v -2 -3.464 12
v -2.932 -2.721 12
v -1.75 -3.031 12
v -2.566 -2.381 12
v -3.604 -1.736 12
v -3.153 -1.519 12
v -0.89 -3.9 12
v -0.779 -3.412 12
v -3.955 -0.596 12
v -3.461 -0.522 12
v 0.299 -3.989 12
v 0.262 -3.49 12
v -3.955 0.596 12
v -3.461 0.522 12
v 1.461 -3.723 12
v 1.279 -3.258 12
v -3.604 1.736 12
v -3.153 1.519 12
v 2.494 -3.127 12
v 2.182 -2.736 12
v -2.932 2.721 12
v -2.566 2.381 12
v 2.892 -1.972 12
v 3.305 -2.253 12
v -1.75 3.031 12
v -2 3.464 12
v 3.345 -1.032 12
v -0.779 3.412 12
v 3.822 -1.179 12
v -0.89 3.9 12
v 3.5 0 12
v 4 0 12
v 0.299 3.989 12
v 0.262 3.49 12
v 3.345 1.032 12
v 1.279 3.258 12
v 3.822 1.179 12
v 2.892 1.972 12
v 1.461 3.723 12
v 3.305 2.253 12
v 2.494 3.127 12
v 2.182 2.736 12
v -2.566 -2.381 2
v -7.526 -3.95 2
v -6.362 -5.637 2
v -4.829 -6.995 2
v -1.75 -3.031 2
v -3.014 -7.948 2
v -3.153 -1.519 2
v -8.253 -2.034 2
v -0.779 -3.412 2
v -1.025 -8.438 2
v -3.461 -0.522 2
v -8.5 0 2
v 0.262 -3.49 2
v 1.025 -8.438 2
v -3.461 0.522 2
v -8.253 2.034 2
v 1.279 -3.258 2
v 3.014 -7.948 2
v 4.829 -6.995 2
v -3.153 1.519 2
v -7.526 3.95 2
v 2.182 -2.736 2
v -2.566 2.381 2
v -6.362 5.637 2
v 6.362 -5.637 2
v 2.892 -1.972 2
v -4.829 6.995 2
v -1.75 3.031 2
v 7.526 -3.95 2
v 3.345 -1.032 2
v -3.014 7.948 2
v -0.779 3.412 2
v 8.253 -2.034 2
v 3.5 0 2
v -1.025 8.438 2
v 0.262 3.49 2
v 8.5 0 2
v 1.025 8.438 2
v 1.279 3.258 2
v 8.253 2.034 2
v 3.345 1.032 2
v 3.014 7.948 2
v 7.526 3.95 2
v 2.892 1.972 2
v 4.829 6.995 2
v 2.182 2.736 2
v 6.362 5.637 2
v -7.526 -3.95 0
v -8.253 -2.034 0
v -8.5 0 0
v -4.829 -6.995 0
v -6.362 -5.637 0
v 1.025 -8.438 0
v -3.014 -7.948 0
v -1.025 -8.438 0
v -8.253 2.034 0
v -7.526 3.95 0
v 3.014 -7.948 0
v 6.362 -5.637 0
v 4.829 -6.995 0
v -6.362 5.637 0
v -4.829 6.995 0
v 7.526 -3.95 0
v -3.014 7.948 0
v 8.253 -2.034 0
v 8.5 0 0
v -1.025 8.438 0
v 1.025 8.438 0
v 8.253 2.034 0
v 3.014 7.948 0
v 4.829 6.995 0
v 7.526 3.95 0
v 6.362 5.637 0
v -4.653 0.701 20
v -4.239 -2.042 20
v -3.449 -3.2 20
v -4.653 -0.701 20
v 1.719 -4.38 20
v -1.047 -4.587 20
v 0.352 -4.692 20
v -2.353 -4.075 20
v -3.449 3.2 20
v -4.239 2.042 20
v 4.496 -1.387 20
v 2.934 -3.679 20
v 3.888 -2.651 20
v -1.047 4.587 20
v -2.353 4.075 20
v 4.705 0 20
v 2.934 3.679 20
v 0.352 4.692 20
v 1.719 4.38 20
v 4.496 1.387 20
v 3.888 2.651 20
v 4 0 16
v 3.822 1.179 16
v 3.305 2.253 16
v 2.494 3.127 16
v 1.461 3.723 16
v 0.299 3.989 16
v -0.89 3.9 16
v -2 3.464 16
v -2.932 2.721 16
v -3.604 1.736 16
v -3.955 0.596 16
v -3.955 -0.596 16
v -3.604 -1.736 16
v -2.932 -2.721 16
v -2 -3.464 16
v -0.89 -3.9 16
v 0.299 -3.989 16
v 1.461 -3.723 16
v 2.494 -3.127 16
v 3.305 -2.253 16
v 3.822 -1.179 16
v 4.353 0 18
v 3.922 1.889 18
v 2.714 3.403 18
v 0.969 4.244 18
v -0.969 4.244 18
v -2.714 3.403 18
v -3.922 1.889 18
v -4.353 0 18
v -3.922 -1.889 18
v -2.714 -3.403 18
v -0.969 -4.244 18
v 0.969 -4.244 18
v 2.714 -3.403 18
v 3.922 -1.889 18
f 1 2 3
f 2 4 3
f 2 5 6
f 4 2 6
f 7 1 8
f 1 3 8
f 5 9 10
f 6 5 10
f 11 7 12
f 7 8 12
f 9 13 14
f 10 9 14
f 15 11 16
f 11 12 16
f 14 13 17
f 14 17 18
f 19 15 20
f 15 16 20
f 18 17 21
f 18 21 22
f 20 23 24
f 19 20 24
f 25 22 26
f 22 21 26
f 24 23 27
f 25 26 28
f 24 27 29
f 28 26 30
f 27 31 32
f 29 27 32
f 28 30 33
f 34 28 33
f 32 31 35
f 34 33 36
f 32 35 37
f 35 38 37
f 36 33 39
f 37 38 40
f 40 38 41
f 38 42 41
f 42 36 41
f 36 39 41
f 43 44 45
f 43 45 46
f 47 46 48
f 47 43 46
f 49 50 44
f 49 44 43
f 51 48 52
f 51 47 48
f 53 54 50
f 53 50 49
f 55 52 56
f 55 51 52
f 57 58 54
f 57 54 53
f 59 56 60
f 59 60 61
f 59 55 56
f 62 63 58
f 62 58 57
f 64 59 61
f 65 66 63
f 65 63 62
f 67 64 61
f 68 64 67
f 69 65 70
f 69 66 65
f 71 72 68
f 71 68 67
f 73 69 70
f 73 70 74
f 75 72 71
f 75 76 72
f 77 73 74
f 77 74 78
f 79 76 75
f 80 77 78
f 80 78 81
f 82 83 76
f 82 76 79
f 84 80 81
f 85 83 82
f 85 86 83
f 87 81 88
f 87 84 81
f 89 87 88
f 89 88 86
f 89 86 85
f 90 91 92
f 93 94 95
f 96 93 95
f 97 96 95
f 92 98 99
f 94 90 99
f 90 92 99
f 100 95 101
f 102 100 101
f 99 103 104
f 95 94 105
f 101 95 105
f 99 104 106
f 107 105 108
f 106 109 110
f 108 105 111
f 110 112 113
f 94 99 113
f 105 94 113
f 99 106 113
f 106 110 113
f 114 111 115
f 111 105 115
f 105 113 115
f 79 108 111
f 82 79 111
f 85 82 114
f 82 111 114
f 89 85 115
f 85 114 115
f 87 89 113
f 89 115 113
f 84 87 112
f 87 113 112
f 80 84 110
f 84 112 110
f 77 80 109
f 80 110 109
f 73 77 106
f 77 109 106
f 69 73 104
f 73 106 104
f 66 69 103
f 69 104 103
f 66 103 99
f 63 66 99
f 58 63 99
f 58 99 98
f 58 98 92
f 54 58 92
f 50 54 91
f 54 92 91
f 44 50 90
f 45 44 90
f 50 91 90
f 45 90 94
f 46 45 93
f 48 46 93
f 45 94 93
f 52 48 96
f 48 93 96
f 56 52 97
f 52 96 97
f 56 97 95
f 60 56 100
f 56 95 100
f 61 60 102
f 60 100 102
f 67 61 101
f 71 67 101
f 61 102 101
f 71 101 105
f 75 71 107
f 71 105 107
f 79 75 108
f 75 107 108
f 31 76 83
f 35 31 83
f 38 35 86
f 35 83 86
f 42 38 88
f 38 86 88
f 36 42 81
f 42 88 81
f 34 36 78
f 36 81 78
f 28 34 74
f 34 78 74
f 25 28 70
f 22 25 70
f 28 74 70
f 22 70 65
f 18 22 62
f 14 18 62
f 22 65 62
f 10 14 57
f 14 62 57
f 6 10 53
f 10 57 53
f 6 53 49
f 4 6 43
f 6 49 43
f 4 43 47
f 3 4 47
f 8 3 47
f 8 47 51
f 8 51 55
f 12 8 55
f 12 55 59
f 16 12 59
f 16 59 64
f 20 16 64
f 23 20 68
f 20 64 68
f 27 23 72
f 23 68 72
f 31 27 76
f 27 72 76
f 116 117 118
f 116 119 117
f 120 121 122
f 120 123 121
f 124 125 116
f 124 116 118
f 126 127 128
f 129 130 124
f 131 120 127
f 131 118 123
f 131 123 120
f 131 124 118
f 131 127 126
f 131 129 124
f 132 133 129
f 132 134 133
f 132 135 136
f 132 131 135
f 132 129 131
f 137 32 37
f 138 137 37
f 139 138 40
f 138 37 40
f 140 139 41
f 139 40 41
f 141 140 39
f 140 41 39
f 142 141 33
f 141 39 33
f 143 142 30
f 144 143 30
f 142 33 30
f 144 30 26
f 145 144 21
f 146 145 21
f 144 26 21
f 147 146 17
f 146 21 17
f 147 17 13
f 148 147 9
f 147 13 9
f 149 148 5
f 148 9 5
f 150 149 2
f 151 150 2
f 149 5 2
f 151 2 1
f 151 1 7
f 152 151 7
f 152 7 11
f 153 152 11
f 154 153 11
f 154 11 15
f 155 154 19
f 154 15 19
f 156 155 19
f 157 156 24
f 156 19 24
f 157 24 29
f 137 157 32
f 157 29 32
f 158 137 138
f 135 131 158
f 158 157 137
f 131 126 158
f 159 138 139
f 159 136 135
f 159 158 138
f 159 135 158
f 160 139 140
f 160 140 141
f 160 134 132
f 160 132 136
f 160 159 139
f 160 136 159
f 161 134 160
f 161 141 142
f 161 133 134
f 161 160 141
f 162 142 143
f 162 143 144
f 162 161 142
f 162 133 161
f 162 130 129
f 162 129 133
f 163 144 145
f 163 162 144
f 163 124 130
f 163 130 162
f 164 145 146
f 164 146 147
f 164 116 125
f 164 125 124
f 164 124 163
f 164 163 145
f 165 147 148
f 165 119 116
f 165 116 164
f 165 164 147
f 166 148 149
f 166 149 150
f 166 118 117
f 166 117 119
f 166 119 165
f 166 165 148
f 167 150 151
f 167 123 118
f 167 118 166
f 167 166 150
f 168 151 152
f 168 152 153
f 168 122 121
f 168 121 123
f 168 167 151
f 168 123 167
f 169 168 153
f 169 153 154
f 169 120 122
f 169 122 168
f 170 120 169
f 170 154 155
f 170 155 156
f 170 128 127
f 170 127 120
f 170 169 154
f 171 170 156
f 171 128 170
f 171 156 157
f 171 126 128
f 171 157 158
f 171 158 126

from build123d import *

# Parameters (mm, degrees)
F0_R      = 8.5
F1_DEPTH  = 2
F2_R      = 3.5
F3_DEPTH  = 10
F4_R      = 4
F5_DEPTH  = 4
F5_FACE_R = 4
F6_DEPTH  = 4
F6_TAPER  = -10


with BuildPart() as f1:
    # F0 (on Top) → F1 (new body)
    with BuildSketch(Plane.XY):
        Circle(F0_R)
    extrude(amount=F1_DEPTH)

    # F2 (on face) → F3 (join)
    with BuildSketch(Plane.XY.offset(2)):
        Circle(F2_R)
    extrude(amount=F3_DEPTH)

    # F4 (on face) → F5 (join)
    with BuildSketch(Plane.XY.offset(12)):
        Circle(F4_R)
    extrude(amount=F5_DEPTH)

    # F5_face (on face) → F6 (join)
    with BuildSketch(Plane.XY.offset(16)):
        Circle(F5_FACE_R)
    extrude(amount=F6_DEPTH, taper=F6_TAPER)


solid = f1.part
